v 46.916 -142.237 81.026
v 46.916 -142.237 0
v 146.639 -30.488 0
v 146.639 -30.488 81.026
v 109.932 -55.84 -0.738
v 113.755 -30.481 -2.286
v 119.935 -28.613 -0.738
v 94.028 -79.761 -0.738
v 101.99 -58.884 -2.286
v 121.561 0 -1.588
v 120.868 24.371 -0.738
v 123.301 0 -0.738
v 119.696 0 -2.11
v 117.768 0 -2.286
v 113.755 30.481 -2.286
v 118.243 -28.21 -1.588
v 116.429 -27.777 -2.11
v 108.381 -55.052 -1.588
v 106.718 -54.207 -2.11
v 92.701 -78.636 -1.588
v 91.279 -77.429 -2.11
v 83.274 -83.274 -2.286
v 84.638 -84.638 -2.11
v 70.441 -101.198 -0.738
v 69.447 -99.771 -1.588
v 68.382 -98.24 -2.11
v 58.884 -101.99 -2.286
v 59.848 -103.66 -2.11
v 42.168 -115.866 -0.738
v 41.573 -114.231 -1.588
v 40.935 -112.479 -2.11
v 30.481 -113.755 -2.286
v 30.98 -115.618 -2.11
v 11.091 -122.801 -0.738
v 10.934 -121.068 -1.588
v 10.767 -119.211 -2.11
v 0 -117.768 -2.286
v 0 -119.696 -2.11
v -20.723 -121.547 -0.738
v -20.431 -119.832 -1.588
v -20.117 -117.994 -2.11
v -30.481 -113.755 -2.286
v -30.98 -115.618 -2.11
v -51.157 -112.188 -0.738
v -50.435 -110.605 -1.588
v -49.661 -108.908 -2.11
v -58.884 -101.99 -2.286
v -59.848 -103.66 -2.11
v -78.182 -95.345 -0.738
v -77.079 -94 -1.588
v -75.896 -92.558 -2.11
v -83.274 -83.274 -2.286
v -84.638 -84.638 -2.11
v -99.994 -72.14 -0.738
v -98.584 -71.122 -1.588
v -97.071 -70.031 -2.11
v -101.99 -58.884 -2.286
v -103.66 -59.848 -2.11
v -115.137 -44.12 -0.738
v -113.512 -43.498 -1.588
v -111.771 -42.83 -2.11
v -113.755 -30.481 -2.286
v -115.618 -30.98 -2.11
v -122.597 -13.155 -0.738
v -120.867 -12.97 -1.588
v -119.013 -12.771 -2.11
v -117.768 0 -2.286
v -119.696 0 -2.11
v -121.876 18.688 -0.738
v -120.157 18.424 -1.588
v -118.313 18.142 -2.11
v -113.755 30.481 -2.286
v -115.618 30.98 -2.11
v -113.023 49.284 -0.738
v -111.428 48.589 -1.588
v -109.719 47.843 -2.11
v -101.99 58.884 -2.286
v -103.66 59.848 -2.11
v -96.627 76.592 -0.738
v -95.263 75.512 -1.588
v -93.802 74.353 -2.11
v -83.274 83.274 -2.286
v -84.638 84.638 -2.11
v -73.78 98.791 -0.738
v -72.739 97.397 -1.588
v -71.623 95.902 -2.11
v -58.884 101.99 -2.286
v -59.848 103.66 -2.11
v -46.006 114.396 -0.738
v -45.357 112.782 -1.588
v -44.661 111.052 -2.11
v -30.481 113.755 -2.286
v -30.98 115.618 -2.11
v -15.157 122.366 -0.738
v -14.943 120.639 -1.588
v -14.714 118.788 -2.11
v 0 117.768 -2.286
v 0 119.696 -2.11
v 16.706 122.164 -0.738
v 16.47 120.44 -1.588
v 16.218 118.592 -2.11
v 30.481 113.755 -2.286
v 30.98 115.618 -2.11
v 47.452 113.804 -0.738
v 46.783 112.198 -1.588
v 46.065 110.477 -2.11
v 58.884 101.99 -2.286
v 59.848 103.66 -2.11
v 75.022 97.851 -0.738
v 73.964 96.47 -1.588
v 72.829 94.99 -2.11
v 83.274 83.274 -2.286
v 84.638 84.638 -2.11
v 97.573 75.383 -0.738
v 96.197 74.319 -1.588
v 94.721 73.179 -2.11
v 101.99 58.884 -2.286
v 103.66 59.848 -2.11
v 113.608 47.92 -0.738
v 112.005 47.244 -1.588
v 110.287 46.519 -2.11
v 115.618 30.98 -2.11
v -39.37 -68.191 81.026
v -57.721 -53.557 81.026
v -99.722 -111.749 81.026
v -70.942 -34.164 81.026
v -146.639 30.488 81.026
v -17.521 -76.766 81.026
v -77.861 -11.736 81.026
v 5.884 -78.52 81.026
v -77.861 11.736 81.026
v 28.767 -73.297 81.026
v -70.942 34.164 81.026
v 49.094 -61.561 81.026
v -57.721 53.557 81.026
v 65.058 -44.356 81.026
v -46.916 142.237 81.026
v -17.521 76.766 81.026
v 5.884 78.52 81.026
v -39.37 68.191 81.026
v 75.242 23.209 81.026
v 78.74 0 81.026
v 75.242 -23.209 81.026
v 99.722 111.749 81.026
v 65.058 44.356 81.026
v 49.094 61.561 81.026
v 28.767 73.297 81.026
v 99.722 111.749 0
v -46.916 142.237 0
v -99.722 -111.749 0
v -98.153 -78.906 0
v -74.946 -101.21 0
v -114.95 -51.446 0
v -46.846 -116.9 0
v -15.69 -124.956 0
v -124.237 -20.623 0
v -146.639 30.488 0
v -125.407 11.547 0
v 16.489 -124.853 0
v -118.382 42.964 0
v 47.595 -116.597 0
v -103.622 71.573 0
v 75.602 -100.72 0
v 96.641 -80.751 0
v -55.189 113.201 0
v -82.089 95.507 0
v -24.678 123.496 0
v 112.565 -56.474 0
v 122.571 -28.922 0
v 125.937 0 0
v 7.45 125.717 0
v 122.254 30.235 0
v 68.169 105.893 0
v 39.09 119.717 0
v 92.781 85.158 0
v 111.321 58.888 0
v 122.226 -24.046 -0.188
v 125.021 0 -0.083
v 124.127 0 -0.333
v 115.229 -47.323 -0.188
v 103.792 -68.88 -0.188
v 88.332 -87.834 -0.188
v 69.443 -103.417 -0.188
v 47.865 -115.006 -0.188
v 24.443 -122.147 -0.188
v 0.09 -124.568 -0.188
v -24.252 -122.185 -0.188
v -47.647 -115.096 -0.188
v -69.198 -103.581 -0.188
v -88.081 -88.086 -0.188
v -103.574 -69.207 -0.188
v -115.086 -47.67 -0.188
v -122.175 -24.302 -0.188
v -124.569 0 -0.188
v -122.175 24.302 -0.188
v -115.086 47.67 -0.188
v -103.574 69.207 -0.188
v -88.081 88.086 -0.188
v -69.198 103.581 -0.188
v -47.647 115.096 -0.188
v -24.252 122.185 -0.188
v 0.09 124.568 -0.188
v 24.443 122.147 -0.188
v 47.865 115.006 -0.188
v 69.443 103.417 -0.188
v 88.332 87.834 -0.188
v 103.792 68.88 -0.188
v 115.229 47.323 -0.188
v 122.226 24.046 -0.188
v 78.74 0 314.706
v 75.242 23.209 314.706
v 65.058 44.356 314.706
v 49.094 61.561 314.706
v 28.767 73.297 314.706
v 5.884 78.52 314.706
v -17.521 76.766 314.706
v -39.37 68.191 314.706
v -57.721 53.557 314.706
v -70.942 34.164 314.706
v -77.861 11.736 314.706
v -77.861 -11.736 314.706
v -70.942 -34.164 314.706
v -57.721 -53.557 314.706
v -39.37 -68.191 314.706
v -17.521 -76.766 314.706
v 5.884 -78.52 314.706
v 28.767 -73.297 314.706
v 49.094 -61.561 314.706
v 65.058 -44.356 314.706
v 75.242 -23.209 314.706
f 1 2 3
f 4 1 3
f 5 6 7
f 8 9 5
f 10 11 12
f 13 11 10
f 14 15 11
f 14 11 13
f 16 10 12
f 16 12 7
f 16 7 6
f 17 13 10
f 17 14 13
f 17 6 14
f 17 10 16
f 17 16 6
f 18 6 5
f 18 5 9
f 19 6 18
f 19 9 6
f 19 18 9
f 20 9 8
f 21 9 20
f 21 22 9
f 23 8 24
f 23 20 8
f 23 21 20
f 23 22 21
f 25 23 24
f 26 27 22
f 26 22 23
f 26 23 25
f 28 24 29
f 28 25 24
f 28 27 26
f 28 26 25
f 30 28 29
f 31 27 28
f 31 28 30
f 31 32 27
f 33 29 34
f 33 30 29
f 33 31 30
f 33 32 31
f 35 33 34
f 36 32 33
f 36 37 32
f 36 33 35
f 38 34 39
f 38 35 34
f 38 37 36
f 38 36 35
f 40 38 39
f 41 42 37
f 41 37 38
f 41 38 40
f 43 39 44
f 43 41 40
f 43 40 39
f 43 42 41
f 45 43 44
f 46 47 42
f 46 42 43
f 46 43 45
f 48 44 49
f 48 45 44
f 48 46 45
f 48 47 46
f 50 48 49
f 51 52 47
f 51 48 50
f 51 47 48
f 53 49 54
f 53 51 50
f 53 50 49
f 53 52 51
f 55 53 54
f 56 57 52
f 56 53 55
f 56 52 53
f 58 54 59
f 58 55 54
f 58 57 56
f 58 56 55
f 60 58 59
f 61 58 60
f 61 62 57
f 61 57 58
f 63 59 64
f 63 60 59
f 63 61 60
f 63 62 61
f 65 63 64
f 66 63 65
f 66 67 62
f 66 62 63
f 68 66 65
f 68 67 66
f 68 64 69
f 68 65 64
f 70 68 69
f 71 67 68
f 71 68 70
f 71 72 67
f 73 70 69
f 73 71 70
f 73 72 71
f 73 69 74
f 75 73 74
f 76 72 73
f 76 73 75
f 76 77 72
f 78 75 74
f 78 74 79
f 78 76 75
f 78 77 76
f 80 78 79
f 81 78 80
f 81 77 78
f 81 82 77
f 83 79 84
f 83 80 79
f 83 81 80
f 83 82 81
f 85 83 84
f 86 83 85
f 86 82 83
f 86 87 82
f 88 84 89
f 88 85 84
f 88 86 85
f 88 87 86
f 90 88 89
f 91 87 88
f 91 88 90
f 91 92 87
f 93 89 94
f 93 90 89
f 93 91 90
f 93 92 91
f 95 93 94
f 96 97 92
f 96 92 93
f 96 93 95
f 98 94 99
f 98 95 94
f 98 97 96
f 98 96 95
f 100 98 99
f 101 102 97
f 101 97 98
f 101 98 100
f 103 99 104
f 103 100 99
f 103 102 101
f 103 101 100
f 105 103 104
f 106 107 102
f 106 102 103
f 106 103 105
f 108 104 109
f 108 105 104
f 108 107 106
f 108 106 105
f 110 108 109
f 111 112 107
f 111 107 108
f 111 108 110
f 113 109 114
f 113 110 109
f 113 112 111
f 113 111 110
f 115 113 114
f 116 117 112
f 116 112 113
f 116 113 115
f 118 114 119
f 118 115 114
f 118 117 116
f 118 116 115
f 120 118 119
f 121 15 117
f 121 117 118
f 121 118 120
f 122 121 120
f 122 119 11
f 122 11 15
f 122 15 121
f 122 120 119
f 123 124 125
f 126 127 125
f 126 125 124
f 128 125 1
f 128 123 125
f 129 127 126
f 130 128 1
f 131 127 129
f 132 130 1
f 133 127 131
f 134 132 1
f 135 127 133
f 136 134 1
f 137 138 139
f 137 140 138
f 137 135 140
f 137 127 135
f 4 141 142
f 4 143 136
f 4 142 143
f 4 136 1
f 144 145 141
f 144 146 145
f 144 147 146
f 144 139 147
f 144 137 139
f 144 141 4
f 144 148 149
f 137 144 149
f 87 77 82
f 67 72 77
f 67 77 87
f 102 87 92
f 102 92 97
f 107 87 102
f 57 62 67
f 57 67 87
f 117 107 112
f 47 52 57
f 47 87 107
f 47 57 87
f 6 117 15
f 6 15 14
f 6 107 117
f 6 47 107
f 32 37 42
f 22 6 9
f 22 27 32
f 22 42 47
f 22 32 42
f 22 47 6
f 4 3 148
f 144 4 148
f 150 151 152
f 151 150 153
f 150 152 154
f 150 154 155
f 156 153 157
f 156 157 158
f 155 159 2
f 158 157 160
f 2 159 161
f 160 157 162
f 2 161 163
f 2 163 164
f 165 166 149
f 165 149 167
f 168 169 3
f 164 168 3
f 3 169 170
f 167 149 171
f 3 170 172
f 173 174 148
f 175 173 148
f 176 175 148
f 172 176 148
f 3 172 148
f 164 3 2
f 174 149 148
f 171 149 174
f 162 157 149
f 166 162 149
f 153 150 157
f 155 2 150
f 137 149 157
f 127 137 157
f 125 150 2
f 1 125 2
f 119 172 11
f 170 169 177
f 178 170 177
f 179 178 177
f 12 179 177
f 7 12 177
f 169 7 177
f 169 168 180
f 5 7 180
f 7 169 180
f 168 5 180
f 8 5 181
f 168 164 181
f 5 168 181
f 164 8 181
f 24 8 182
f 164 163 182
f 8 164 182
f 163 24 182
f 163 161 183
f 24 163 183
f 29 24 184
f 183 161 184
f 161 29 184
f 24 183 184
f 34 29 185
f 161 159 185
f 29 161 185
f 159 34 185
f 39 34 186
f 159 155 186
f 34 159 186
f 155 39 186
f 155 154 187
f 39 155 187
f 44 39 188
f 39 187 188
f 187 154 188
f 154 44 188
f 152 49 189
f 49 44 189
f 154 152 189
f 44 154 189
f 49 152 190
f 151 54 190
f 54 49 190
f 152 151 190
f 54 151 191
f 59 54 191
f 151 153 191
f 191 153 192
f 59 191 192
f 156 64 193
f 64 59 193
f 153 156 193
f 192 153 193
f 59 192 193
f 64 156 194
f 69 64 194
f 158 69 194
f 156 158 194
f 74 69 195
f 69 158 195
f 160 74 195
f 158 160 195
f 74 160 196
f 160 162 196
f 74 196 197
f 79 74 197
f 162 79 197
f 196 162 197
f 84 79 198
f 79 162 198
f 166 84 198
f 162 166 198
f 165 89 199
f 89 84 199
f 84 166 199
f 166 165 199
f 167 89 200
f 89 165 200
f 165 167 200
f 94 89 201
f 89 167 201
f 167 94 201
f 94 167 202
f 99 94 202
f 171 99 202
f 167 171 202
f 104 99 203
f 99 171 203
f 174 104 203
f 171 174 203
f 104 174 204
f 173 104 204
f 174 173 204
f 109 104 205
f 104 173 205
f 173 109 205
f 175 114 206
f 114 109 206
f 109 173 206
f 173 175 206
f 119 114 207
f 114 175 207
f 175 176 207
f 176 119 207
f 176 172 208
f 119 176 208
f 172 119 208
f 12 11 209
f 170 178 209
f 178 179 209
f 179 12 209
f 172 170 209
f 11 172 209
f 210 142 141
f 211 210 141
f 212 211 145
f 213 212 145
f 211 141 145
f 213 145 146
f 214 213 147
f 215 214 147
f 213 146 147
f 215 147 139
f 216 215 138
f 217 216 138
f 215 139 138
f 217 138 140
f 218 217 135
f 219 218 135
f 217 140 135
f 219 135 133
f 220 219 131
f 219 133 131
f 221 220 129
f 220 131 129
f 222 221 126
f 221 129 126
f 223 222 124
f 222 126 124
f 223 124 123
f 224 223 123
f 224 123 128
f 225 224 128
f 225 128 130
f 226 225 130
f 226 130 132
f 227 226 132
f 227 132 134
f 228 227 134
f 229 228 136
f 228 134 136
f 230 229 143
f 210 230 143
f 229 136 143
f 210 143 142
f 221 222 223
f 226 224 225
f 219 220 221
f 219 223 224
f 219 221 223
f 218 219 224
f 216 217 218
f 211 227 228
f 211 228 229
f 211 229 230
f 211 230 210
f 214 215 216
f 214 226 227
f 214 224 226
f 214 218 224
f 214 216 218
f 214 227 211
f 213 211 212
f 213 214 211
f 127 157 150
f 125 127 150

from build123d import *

# Parameters (mm, degrees)
F1_DEPTH = 81.026
F2_R     = 78.74
F3_DEPTH = 233.68
F4_R     = 124.3645263244
F5_DEPTH = 2.286
F7_R     = 5.08


# Not quite as in the source:
# - a fillet or chamfer that OpenCascade refuses, or shapes differently, is made with other operations: its cross-section is extruded or revolved along the edge and cut away or added


with BuildPart() as f1:
    # F0 (on Top) → F1 (new body)
    with BuildSketch(Plane.XY):
        Polygon((46.9164714903, -142.236754682), (146.6388786516, -30.4875211745), (99.7224071613, 111.7492335075), (-46.9164714903, 142.236754682), (-146.6388786516, 30.4875211745), (-99.7224071613, -111.7492335075), align=None)
    extrude(amount=F1_DEPTH)

    # F2 (on face) → F3 (join)
    with BuildSketch(Plane.XY.offset(81.026)):
        Circle(F2_R)
    extrude(amount=F3_DEPTH)

    # F4 (on face) → F5 (join)
    with BuildSketch(Plane(origin=(0, 0, 0), x_dir=(1, 0, 0), z_dir=(0, 0, -1))):
        Circle(F4_R)
    extrude(amount=F5_DEPTH)

    # F6: fillet of radius 10.6614809392 on 1 edges, made by hand

    # F6_s1 → F6_t2 (revolve, cut)
    with BuildSketch(Plane.XZ):
        with BuildLine():
            ThreePointArc((124.3645263244, 0), (121.2585269877, -1.6983020197), (117.767671403, -2.286))
            Line((117.767671403, -2.286), (124.3645263244, -2.286))
            Line((124.3645263244, -2.286), (124.3645263244, 0))
        make_face()
    revolve(axis=Axis((0, 0, -2.286), (0, 0, -1)), mode=Mode.SUBTRACT)

    # F7
    f7_edges = [f1.edges().sort_by_distance(p)[0] for p in [
        (-124.364526, 0, 0),
    ]]
    fillet(f7_edges, radius=F7_R)


solid = f1.part
